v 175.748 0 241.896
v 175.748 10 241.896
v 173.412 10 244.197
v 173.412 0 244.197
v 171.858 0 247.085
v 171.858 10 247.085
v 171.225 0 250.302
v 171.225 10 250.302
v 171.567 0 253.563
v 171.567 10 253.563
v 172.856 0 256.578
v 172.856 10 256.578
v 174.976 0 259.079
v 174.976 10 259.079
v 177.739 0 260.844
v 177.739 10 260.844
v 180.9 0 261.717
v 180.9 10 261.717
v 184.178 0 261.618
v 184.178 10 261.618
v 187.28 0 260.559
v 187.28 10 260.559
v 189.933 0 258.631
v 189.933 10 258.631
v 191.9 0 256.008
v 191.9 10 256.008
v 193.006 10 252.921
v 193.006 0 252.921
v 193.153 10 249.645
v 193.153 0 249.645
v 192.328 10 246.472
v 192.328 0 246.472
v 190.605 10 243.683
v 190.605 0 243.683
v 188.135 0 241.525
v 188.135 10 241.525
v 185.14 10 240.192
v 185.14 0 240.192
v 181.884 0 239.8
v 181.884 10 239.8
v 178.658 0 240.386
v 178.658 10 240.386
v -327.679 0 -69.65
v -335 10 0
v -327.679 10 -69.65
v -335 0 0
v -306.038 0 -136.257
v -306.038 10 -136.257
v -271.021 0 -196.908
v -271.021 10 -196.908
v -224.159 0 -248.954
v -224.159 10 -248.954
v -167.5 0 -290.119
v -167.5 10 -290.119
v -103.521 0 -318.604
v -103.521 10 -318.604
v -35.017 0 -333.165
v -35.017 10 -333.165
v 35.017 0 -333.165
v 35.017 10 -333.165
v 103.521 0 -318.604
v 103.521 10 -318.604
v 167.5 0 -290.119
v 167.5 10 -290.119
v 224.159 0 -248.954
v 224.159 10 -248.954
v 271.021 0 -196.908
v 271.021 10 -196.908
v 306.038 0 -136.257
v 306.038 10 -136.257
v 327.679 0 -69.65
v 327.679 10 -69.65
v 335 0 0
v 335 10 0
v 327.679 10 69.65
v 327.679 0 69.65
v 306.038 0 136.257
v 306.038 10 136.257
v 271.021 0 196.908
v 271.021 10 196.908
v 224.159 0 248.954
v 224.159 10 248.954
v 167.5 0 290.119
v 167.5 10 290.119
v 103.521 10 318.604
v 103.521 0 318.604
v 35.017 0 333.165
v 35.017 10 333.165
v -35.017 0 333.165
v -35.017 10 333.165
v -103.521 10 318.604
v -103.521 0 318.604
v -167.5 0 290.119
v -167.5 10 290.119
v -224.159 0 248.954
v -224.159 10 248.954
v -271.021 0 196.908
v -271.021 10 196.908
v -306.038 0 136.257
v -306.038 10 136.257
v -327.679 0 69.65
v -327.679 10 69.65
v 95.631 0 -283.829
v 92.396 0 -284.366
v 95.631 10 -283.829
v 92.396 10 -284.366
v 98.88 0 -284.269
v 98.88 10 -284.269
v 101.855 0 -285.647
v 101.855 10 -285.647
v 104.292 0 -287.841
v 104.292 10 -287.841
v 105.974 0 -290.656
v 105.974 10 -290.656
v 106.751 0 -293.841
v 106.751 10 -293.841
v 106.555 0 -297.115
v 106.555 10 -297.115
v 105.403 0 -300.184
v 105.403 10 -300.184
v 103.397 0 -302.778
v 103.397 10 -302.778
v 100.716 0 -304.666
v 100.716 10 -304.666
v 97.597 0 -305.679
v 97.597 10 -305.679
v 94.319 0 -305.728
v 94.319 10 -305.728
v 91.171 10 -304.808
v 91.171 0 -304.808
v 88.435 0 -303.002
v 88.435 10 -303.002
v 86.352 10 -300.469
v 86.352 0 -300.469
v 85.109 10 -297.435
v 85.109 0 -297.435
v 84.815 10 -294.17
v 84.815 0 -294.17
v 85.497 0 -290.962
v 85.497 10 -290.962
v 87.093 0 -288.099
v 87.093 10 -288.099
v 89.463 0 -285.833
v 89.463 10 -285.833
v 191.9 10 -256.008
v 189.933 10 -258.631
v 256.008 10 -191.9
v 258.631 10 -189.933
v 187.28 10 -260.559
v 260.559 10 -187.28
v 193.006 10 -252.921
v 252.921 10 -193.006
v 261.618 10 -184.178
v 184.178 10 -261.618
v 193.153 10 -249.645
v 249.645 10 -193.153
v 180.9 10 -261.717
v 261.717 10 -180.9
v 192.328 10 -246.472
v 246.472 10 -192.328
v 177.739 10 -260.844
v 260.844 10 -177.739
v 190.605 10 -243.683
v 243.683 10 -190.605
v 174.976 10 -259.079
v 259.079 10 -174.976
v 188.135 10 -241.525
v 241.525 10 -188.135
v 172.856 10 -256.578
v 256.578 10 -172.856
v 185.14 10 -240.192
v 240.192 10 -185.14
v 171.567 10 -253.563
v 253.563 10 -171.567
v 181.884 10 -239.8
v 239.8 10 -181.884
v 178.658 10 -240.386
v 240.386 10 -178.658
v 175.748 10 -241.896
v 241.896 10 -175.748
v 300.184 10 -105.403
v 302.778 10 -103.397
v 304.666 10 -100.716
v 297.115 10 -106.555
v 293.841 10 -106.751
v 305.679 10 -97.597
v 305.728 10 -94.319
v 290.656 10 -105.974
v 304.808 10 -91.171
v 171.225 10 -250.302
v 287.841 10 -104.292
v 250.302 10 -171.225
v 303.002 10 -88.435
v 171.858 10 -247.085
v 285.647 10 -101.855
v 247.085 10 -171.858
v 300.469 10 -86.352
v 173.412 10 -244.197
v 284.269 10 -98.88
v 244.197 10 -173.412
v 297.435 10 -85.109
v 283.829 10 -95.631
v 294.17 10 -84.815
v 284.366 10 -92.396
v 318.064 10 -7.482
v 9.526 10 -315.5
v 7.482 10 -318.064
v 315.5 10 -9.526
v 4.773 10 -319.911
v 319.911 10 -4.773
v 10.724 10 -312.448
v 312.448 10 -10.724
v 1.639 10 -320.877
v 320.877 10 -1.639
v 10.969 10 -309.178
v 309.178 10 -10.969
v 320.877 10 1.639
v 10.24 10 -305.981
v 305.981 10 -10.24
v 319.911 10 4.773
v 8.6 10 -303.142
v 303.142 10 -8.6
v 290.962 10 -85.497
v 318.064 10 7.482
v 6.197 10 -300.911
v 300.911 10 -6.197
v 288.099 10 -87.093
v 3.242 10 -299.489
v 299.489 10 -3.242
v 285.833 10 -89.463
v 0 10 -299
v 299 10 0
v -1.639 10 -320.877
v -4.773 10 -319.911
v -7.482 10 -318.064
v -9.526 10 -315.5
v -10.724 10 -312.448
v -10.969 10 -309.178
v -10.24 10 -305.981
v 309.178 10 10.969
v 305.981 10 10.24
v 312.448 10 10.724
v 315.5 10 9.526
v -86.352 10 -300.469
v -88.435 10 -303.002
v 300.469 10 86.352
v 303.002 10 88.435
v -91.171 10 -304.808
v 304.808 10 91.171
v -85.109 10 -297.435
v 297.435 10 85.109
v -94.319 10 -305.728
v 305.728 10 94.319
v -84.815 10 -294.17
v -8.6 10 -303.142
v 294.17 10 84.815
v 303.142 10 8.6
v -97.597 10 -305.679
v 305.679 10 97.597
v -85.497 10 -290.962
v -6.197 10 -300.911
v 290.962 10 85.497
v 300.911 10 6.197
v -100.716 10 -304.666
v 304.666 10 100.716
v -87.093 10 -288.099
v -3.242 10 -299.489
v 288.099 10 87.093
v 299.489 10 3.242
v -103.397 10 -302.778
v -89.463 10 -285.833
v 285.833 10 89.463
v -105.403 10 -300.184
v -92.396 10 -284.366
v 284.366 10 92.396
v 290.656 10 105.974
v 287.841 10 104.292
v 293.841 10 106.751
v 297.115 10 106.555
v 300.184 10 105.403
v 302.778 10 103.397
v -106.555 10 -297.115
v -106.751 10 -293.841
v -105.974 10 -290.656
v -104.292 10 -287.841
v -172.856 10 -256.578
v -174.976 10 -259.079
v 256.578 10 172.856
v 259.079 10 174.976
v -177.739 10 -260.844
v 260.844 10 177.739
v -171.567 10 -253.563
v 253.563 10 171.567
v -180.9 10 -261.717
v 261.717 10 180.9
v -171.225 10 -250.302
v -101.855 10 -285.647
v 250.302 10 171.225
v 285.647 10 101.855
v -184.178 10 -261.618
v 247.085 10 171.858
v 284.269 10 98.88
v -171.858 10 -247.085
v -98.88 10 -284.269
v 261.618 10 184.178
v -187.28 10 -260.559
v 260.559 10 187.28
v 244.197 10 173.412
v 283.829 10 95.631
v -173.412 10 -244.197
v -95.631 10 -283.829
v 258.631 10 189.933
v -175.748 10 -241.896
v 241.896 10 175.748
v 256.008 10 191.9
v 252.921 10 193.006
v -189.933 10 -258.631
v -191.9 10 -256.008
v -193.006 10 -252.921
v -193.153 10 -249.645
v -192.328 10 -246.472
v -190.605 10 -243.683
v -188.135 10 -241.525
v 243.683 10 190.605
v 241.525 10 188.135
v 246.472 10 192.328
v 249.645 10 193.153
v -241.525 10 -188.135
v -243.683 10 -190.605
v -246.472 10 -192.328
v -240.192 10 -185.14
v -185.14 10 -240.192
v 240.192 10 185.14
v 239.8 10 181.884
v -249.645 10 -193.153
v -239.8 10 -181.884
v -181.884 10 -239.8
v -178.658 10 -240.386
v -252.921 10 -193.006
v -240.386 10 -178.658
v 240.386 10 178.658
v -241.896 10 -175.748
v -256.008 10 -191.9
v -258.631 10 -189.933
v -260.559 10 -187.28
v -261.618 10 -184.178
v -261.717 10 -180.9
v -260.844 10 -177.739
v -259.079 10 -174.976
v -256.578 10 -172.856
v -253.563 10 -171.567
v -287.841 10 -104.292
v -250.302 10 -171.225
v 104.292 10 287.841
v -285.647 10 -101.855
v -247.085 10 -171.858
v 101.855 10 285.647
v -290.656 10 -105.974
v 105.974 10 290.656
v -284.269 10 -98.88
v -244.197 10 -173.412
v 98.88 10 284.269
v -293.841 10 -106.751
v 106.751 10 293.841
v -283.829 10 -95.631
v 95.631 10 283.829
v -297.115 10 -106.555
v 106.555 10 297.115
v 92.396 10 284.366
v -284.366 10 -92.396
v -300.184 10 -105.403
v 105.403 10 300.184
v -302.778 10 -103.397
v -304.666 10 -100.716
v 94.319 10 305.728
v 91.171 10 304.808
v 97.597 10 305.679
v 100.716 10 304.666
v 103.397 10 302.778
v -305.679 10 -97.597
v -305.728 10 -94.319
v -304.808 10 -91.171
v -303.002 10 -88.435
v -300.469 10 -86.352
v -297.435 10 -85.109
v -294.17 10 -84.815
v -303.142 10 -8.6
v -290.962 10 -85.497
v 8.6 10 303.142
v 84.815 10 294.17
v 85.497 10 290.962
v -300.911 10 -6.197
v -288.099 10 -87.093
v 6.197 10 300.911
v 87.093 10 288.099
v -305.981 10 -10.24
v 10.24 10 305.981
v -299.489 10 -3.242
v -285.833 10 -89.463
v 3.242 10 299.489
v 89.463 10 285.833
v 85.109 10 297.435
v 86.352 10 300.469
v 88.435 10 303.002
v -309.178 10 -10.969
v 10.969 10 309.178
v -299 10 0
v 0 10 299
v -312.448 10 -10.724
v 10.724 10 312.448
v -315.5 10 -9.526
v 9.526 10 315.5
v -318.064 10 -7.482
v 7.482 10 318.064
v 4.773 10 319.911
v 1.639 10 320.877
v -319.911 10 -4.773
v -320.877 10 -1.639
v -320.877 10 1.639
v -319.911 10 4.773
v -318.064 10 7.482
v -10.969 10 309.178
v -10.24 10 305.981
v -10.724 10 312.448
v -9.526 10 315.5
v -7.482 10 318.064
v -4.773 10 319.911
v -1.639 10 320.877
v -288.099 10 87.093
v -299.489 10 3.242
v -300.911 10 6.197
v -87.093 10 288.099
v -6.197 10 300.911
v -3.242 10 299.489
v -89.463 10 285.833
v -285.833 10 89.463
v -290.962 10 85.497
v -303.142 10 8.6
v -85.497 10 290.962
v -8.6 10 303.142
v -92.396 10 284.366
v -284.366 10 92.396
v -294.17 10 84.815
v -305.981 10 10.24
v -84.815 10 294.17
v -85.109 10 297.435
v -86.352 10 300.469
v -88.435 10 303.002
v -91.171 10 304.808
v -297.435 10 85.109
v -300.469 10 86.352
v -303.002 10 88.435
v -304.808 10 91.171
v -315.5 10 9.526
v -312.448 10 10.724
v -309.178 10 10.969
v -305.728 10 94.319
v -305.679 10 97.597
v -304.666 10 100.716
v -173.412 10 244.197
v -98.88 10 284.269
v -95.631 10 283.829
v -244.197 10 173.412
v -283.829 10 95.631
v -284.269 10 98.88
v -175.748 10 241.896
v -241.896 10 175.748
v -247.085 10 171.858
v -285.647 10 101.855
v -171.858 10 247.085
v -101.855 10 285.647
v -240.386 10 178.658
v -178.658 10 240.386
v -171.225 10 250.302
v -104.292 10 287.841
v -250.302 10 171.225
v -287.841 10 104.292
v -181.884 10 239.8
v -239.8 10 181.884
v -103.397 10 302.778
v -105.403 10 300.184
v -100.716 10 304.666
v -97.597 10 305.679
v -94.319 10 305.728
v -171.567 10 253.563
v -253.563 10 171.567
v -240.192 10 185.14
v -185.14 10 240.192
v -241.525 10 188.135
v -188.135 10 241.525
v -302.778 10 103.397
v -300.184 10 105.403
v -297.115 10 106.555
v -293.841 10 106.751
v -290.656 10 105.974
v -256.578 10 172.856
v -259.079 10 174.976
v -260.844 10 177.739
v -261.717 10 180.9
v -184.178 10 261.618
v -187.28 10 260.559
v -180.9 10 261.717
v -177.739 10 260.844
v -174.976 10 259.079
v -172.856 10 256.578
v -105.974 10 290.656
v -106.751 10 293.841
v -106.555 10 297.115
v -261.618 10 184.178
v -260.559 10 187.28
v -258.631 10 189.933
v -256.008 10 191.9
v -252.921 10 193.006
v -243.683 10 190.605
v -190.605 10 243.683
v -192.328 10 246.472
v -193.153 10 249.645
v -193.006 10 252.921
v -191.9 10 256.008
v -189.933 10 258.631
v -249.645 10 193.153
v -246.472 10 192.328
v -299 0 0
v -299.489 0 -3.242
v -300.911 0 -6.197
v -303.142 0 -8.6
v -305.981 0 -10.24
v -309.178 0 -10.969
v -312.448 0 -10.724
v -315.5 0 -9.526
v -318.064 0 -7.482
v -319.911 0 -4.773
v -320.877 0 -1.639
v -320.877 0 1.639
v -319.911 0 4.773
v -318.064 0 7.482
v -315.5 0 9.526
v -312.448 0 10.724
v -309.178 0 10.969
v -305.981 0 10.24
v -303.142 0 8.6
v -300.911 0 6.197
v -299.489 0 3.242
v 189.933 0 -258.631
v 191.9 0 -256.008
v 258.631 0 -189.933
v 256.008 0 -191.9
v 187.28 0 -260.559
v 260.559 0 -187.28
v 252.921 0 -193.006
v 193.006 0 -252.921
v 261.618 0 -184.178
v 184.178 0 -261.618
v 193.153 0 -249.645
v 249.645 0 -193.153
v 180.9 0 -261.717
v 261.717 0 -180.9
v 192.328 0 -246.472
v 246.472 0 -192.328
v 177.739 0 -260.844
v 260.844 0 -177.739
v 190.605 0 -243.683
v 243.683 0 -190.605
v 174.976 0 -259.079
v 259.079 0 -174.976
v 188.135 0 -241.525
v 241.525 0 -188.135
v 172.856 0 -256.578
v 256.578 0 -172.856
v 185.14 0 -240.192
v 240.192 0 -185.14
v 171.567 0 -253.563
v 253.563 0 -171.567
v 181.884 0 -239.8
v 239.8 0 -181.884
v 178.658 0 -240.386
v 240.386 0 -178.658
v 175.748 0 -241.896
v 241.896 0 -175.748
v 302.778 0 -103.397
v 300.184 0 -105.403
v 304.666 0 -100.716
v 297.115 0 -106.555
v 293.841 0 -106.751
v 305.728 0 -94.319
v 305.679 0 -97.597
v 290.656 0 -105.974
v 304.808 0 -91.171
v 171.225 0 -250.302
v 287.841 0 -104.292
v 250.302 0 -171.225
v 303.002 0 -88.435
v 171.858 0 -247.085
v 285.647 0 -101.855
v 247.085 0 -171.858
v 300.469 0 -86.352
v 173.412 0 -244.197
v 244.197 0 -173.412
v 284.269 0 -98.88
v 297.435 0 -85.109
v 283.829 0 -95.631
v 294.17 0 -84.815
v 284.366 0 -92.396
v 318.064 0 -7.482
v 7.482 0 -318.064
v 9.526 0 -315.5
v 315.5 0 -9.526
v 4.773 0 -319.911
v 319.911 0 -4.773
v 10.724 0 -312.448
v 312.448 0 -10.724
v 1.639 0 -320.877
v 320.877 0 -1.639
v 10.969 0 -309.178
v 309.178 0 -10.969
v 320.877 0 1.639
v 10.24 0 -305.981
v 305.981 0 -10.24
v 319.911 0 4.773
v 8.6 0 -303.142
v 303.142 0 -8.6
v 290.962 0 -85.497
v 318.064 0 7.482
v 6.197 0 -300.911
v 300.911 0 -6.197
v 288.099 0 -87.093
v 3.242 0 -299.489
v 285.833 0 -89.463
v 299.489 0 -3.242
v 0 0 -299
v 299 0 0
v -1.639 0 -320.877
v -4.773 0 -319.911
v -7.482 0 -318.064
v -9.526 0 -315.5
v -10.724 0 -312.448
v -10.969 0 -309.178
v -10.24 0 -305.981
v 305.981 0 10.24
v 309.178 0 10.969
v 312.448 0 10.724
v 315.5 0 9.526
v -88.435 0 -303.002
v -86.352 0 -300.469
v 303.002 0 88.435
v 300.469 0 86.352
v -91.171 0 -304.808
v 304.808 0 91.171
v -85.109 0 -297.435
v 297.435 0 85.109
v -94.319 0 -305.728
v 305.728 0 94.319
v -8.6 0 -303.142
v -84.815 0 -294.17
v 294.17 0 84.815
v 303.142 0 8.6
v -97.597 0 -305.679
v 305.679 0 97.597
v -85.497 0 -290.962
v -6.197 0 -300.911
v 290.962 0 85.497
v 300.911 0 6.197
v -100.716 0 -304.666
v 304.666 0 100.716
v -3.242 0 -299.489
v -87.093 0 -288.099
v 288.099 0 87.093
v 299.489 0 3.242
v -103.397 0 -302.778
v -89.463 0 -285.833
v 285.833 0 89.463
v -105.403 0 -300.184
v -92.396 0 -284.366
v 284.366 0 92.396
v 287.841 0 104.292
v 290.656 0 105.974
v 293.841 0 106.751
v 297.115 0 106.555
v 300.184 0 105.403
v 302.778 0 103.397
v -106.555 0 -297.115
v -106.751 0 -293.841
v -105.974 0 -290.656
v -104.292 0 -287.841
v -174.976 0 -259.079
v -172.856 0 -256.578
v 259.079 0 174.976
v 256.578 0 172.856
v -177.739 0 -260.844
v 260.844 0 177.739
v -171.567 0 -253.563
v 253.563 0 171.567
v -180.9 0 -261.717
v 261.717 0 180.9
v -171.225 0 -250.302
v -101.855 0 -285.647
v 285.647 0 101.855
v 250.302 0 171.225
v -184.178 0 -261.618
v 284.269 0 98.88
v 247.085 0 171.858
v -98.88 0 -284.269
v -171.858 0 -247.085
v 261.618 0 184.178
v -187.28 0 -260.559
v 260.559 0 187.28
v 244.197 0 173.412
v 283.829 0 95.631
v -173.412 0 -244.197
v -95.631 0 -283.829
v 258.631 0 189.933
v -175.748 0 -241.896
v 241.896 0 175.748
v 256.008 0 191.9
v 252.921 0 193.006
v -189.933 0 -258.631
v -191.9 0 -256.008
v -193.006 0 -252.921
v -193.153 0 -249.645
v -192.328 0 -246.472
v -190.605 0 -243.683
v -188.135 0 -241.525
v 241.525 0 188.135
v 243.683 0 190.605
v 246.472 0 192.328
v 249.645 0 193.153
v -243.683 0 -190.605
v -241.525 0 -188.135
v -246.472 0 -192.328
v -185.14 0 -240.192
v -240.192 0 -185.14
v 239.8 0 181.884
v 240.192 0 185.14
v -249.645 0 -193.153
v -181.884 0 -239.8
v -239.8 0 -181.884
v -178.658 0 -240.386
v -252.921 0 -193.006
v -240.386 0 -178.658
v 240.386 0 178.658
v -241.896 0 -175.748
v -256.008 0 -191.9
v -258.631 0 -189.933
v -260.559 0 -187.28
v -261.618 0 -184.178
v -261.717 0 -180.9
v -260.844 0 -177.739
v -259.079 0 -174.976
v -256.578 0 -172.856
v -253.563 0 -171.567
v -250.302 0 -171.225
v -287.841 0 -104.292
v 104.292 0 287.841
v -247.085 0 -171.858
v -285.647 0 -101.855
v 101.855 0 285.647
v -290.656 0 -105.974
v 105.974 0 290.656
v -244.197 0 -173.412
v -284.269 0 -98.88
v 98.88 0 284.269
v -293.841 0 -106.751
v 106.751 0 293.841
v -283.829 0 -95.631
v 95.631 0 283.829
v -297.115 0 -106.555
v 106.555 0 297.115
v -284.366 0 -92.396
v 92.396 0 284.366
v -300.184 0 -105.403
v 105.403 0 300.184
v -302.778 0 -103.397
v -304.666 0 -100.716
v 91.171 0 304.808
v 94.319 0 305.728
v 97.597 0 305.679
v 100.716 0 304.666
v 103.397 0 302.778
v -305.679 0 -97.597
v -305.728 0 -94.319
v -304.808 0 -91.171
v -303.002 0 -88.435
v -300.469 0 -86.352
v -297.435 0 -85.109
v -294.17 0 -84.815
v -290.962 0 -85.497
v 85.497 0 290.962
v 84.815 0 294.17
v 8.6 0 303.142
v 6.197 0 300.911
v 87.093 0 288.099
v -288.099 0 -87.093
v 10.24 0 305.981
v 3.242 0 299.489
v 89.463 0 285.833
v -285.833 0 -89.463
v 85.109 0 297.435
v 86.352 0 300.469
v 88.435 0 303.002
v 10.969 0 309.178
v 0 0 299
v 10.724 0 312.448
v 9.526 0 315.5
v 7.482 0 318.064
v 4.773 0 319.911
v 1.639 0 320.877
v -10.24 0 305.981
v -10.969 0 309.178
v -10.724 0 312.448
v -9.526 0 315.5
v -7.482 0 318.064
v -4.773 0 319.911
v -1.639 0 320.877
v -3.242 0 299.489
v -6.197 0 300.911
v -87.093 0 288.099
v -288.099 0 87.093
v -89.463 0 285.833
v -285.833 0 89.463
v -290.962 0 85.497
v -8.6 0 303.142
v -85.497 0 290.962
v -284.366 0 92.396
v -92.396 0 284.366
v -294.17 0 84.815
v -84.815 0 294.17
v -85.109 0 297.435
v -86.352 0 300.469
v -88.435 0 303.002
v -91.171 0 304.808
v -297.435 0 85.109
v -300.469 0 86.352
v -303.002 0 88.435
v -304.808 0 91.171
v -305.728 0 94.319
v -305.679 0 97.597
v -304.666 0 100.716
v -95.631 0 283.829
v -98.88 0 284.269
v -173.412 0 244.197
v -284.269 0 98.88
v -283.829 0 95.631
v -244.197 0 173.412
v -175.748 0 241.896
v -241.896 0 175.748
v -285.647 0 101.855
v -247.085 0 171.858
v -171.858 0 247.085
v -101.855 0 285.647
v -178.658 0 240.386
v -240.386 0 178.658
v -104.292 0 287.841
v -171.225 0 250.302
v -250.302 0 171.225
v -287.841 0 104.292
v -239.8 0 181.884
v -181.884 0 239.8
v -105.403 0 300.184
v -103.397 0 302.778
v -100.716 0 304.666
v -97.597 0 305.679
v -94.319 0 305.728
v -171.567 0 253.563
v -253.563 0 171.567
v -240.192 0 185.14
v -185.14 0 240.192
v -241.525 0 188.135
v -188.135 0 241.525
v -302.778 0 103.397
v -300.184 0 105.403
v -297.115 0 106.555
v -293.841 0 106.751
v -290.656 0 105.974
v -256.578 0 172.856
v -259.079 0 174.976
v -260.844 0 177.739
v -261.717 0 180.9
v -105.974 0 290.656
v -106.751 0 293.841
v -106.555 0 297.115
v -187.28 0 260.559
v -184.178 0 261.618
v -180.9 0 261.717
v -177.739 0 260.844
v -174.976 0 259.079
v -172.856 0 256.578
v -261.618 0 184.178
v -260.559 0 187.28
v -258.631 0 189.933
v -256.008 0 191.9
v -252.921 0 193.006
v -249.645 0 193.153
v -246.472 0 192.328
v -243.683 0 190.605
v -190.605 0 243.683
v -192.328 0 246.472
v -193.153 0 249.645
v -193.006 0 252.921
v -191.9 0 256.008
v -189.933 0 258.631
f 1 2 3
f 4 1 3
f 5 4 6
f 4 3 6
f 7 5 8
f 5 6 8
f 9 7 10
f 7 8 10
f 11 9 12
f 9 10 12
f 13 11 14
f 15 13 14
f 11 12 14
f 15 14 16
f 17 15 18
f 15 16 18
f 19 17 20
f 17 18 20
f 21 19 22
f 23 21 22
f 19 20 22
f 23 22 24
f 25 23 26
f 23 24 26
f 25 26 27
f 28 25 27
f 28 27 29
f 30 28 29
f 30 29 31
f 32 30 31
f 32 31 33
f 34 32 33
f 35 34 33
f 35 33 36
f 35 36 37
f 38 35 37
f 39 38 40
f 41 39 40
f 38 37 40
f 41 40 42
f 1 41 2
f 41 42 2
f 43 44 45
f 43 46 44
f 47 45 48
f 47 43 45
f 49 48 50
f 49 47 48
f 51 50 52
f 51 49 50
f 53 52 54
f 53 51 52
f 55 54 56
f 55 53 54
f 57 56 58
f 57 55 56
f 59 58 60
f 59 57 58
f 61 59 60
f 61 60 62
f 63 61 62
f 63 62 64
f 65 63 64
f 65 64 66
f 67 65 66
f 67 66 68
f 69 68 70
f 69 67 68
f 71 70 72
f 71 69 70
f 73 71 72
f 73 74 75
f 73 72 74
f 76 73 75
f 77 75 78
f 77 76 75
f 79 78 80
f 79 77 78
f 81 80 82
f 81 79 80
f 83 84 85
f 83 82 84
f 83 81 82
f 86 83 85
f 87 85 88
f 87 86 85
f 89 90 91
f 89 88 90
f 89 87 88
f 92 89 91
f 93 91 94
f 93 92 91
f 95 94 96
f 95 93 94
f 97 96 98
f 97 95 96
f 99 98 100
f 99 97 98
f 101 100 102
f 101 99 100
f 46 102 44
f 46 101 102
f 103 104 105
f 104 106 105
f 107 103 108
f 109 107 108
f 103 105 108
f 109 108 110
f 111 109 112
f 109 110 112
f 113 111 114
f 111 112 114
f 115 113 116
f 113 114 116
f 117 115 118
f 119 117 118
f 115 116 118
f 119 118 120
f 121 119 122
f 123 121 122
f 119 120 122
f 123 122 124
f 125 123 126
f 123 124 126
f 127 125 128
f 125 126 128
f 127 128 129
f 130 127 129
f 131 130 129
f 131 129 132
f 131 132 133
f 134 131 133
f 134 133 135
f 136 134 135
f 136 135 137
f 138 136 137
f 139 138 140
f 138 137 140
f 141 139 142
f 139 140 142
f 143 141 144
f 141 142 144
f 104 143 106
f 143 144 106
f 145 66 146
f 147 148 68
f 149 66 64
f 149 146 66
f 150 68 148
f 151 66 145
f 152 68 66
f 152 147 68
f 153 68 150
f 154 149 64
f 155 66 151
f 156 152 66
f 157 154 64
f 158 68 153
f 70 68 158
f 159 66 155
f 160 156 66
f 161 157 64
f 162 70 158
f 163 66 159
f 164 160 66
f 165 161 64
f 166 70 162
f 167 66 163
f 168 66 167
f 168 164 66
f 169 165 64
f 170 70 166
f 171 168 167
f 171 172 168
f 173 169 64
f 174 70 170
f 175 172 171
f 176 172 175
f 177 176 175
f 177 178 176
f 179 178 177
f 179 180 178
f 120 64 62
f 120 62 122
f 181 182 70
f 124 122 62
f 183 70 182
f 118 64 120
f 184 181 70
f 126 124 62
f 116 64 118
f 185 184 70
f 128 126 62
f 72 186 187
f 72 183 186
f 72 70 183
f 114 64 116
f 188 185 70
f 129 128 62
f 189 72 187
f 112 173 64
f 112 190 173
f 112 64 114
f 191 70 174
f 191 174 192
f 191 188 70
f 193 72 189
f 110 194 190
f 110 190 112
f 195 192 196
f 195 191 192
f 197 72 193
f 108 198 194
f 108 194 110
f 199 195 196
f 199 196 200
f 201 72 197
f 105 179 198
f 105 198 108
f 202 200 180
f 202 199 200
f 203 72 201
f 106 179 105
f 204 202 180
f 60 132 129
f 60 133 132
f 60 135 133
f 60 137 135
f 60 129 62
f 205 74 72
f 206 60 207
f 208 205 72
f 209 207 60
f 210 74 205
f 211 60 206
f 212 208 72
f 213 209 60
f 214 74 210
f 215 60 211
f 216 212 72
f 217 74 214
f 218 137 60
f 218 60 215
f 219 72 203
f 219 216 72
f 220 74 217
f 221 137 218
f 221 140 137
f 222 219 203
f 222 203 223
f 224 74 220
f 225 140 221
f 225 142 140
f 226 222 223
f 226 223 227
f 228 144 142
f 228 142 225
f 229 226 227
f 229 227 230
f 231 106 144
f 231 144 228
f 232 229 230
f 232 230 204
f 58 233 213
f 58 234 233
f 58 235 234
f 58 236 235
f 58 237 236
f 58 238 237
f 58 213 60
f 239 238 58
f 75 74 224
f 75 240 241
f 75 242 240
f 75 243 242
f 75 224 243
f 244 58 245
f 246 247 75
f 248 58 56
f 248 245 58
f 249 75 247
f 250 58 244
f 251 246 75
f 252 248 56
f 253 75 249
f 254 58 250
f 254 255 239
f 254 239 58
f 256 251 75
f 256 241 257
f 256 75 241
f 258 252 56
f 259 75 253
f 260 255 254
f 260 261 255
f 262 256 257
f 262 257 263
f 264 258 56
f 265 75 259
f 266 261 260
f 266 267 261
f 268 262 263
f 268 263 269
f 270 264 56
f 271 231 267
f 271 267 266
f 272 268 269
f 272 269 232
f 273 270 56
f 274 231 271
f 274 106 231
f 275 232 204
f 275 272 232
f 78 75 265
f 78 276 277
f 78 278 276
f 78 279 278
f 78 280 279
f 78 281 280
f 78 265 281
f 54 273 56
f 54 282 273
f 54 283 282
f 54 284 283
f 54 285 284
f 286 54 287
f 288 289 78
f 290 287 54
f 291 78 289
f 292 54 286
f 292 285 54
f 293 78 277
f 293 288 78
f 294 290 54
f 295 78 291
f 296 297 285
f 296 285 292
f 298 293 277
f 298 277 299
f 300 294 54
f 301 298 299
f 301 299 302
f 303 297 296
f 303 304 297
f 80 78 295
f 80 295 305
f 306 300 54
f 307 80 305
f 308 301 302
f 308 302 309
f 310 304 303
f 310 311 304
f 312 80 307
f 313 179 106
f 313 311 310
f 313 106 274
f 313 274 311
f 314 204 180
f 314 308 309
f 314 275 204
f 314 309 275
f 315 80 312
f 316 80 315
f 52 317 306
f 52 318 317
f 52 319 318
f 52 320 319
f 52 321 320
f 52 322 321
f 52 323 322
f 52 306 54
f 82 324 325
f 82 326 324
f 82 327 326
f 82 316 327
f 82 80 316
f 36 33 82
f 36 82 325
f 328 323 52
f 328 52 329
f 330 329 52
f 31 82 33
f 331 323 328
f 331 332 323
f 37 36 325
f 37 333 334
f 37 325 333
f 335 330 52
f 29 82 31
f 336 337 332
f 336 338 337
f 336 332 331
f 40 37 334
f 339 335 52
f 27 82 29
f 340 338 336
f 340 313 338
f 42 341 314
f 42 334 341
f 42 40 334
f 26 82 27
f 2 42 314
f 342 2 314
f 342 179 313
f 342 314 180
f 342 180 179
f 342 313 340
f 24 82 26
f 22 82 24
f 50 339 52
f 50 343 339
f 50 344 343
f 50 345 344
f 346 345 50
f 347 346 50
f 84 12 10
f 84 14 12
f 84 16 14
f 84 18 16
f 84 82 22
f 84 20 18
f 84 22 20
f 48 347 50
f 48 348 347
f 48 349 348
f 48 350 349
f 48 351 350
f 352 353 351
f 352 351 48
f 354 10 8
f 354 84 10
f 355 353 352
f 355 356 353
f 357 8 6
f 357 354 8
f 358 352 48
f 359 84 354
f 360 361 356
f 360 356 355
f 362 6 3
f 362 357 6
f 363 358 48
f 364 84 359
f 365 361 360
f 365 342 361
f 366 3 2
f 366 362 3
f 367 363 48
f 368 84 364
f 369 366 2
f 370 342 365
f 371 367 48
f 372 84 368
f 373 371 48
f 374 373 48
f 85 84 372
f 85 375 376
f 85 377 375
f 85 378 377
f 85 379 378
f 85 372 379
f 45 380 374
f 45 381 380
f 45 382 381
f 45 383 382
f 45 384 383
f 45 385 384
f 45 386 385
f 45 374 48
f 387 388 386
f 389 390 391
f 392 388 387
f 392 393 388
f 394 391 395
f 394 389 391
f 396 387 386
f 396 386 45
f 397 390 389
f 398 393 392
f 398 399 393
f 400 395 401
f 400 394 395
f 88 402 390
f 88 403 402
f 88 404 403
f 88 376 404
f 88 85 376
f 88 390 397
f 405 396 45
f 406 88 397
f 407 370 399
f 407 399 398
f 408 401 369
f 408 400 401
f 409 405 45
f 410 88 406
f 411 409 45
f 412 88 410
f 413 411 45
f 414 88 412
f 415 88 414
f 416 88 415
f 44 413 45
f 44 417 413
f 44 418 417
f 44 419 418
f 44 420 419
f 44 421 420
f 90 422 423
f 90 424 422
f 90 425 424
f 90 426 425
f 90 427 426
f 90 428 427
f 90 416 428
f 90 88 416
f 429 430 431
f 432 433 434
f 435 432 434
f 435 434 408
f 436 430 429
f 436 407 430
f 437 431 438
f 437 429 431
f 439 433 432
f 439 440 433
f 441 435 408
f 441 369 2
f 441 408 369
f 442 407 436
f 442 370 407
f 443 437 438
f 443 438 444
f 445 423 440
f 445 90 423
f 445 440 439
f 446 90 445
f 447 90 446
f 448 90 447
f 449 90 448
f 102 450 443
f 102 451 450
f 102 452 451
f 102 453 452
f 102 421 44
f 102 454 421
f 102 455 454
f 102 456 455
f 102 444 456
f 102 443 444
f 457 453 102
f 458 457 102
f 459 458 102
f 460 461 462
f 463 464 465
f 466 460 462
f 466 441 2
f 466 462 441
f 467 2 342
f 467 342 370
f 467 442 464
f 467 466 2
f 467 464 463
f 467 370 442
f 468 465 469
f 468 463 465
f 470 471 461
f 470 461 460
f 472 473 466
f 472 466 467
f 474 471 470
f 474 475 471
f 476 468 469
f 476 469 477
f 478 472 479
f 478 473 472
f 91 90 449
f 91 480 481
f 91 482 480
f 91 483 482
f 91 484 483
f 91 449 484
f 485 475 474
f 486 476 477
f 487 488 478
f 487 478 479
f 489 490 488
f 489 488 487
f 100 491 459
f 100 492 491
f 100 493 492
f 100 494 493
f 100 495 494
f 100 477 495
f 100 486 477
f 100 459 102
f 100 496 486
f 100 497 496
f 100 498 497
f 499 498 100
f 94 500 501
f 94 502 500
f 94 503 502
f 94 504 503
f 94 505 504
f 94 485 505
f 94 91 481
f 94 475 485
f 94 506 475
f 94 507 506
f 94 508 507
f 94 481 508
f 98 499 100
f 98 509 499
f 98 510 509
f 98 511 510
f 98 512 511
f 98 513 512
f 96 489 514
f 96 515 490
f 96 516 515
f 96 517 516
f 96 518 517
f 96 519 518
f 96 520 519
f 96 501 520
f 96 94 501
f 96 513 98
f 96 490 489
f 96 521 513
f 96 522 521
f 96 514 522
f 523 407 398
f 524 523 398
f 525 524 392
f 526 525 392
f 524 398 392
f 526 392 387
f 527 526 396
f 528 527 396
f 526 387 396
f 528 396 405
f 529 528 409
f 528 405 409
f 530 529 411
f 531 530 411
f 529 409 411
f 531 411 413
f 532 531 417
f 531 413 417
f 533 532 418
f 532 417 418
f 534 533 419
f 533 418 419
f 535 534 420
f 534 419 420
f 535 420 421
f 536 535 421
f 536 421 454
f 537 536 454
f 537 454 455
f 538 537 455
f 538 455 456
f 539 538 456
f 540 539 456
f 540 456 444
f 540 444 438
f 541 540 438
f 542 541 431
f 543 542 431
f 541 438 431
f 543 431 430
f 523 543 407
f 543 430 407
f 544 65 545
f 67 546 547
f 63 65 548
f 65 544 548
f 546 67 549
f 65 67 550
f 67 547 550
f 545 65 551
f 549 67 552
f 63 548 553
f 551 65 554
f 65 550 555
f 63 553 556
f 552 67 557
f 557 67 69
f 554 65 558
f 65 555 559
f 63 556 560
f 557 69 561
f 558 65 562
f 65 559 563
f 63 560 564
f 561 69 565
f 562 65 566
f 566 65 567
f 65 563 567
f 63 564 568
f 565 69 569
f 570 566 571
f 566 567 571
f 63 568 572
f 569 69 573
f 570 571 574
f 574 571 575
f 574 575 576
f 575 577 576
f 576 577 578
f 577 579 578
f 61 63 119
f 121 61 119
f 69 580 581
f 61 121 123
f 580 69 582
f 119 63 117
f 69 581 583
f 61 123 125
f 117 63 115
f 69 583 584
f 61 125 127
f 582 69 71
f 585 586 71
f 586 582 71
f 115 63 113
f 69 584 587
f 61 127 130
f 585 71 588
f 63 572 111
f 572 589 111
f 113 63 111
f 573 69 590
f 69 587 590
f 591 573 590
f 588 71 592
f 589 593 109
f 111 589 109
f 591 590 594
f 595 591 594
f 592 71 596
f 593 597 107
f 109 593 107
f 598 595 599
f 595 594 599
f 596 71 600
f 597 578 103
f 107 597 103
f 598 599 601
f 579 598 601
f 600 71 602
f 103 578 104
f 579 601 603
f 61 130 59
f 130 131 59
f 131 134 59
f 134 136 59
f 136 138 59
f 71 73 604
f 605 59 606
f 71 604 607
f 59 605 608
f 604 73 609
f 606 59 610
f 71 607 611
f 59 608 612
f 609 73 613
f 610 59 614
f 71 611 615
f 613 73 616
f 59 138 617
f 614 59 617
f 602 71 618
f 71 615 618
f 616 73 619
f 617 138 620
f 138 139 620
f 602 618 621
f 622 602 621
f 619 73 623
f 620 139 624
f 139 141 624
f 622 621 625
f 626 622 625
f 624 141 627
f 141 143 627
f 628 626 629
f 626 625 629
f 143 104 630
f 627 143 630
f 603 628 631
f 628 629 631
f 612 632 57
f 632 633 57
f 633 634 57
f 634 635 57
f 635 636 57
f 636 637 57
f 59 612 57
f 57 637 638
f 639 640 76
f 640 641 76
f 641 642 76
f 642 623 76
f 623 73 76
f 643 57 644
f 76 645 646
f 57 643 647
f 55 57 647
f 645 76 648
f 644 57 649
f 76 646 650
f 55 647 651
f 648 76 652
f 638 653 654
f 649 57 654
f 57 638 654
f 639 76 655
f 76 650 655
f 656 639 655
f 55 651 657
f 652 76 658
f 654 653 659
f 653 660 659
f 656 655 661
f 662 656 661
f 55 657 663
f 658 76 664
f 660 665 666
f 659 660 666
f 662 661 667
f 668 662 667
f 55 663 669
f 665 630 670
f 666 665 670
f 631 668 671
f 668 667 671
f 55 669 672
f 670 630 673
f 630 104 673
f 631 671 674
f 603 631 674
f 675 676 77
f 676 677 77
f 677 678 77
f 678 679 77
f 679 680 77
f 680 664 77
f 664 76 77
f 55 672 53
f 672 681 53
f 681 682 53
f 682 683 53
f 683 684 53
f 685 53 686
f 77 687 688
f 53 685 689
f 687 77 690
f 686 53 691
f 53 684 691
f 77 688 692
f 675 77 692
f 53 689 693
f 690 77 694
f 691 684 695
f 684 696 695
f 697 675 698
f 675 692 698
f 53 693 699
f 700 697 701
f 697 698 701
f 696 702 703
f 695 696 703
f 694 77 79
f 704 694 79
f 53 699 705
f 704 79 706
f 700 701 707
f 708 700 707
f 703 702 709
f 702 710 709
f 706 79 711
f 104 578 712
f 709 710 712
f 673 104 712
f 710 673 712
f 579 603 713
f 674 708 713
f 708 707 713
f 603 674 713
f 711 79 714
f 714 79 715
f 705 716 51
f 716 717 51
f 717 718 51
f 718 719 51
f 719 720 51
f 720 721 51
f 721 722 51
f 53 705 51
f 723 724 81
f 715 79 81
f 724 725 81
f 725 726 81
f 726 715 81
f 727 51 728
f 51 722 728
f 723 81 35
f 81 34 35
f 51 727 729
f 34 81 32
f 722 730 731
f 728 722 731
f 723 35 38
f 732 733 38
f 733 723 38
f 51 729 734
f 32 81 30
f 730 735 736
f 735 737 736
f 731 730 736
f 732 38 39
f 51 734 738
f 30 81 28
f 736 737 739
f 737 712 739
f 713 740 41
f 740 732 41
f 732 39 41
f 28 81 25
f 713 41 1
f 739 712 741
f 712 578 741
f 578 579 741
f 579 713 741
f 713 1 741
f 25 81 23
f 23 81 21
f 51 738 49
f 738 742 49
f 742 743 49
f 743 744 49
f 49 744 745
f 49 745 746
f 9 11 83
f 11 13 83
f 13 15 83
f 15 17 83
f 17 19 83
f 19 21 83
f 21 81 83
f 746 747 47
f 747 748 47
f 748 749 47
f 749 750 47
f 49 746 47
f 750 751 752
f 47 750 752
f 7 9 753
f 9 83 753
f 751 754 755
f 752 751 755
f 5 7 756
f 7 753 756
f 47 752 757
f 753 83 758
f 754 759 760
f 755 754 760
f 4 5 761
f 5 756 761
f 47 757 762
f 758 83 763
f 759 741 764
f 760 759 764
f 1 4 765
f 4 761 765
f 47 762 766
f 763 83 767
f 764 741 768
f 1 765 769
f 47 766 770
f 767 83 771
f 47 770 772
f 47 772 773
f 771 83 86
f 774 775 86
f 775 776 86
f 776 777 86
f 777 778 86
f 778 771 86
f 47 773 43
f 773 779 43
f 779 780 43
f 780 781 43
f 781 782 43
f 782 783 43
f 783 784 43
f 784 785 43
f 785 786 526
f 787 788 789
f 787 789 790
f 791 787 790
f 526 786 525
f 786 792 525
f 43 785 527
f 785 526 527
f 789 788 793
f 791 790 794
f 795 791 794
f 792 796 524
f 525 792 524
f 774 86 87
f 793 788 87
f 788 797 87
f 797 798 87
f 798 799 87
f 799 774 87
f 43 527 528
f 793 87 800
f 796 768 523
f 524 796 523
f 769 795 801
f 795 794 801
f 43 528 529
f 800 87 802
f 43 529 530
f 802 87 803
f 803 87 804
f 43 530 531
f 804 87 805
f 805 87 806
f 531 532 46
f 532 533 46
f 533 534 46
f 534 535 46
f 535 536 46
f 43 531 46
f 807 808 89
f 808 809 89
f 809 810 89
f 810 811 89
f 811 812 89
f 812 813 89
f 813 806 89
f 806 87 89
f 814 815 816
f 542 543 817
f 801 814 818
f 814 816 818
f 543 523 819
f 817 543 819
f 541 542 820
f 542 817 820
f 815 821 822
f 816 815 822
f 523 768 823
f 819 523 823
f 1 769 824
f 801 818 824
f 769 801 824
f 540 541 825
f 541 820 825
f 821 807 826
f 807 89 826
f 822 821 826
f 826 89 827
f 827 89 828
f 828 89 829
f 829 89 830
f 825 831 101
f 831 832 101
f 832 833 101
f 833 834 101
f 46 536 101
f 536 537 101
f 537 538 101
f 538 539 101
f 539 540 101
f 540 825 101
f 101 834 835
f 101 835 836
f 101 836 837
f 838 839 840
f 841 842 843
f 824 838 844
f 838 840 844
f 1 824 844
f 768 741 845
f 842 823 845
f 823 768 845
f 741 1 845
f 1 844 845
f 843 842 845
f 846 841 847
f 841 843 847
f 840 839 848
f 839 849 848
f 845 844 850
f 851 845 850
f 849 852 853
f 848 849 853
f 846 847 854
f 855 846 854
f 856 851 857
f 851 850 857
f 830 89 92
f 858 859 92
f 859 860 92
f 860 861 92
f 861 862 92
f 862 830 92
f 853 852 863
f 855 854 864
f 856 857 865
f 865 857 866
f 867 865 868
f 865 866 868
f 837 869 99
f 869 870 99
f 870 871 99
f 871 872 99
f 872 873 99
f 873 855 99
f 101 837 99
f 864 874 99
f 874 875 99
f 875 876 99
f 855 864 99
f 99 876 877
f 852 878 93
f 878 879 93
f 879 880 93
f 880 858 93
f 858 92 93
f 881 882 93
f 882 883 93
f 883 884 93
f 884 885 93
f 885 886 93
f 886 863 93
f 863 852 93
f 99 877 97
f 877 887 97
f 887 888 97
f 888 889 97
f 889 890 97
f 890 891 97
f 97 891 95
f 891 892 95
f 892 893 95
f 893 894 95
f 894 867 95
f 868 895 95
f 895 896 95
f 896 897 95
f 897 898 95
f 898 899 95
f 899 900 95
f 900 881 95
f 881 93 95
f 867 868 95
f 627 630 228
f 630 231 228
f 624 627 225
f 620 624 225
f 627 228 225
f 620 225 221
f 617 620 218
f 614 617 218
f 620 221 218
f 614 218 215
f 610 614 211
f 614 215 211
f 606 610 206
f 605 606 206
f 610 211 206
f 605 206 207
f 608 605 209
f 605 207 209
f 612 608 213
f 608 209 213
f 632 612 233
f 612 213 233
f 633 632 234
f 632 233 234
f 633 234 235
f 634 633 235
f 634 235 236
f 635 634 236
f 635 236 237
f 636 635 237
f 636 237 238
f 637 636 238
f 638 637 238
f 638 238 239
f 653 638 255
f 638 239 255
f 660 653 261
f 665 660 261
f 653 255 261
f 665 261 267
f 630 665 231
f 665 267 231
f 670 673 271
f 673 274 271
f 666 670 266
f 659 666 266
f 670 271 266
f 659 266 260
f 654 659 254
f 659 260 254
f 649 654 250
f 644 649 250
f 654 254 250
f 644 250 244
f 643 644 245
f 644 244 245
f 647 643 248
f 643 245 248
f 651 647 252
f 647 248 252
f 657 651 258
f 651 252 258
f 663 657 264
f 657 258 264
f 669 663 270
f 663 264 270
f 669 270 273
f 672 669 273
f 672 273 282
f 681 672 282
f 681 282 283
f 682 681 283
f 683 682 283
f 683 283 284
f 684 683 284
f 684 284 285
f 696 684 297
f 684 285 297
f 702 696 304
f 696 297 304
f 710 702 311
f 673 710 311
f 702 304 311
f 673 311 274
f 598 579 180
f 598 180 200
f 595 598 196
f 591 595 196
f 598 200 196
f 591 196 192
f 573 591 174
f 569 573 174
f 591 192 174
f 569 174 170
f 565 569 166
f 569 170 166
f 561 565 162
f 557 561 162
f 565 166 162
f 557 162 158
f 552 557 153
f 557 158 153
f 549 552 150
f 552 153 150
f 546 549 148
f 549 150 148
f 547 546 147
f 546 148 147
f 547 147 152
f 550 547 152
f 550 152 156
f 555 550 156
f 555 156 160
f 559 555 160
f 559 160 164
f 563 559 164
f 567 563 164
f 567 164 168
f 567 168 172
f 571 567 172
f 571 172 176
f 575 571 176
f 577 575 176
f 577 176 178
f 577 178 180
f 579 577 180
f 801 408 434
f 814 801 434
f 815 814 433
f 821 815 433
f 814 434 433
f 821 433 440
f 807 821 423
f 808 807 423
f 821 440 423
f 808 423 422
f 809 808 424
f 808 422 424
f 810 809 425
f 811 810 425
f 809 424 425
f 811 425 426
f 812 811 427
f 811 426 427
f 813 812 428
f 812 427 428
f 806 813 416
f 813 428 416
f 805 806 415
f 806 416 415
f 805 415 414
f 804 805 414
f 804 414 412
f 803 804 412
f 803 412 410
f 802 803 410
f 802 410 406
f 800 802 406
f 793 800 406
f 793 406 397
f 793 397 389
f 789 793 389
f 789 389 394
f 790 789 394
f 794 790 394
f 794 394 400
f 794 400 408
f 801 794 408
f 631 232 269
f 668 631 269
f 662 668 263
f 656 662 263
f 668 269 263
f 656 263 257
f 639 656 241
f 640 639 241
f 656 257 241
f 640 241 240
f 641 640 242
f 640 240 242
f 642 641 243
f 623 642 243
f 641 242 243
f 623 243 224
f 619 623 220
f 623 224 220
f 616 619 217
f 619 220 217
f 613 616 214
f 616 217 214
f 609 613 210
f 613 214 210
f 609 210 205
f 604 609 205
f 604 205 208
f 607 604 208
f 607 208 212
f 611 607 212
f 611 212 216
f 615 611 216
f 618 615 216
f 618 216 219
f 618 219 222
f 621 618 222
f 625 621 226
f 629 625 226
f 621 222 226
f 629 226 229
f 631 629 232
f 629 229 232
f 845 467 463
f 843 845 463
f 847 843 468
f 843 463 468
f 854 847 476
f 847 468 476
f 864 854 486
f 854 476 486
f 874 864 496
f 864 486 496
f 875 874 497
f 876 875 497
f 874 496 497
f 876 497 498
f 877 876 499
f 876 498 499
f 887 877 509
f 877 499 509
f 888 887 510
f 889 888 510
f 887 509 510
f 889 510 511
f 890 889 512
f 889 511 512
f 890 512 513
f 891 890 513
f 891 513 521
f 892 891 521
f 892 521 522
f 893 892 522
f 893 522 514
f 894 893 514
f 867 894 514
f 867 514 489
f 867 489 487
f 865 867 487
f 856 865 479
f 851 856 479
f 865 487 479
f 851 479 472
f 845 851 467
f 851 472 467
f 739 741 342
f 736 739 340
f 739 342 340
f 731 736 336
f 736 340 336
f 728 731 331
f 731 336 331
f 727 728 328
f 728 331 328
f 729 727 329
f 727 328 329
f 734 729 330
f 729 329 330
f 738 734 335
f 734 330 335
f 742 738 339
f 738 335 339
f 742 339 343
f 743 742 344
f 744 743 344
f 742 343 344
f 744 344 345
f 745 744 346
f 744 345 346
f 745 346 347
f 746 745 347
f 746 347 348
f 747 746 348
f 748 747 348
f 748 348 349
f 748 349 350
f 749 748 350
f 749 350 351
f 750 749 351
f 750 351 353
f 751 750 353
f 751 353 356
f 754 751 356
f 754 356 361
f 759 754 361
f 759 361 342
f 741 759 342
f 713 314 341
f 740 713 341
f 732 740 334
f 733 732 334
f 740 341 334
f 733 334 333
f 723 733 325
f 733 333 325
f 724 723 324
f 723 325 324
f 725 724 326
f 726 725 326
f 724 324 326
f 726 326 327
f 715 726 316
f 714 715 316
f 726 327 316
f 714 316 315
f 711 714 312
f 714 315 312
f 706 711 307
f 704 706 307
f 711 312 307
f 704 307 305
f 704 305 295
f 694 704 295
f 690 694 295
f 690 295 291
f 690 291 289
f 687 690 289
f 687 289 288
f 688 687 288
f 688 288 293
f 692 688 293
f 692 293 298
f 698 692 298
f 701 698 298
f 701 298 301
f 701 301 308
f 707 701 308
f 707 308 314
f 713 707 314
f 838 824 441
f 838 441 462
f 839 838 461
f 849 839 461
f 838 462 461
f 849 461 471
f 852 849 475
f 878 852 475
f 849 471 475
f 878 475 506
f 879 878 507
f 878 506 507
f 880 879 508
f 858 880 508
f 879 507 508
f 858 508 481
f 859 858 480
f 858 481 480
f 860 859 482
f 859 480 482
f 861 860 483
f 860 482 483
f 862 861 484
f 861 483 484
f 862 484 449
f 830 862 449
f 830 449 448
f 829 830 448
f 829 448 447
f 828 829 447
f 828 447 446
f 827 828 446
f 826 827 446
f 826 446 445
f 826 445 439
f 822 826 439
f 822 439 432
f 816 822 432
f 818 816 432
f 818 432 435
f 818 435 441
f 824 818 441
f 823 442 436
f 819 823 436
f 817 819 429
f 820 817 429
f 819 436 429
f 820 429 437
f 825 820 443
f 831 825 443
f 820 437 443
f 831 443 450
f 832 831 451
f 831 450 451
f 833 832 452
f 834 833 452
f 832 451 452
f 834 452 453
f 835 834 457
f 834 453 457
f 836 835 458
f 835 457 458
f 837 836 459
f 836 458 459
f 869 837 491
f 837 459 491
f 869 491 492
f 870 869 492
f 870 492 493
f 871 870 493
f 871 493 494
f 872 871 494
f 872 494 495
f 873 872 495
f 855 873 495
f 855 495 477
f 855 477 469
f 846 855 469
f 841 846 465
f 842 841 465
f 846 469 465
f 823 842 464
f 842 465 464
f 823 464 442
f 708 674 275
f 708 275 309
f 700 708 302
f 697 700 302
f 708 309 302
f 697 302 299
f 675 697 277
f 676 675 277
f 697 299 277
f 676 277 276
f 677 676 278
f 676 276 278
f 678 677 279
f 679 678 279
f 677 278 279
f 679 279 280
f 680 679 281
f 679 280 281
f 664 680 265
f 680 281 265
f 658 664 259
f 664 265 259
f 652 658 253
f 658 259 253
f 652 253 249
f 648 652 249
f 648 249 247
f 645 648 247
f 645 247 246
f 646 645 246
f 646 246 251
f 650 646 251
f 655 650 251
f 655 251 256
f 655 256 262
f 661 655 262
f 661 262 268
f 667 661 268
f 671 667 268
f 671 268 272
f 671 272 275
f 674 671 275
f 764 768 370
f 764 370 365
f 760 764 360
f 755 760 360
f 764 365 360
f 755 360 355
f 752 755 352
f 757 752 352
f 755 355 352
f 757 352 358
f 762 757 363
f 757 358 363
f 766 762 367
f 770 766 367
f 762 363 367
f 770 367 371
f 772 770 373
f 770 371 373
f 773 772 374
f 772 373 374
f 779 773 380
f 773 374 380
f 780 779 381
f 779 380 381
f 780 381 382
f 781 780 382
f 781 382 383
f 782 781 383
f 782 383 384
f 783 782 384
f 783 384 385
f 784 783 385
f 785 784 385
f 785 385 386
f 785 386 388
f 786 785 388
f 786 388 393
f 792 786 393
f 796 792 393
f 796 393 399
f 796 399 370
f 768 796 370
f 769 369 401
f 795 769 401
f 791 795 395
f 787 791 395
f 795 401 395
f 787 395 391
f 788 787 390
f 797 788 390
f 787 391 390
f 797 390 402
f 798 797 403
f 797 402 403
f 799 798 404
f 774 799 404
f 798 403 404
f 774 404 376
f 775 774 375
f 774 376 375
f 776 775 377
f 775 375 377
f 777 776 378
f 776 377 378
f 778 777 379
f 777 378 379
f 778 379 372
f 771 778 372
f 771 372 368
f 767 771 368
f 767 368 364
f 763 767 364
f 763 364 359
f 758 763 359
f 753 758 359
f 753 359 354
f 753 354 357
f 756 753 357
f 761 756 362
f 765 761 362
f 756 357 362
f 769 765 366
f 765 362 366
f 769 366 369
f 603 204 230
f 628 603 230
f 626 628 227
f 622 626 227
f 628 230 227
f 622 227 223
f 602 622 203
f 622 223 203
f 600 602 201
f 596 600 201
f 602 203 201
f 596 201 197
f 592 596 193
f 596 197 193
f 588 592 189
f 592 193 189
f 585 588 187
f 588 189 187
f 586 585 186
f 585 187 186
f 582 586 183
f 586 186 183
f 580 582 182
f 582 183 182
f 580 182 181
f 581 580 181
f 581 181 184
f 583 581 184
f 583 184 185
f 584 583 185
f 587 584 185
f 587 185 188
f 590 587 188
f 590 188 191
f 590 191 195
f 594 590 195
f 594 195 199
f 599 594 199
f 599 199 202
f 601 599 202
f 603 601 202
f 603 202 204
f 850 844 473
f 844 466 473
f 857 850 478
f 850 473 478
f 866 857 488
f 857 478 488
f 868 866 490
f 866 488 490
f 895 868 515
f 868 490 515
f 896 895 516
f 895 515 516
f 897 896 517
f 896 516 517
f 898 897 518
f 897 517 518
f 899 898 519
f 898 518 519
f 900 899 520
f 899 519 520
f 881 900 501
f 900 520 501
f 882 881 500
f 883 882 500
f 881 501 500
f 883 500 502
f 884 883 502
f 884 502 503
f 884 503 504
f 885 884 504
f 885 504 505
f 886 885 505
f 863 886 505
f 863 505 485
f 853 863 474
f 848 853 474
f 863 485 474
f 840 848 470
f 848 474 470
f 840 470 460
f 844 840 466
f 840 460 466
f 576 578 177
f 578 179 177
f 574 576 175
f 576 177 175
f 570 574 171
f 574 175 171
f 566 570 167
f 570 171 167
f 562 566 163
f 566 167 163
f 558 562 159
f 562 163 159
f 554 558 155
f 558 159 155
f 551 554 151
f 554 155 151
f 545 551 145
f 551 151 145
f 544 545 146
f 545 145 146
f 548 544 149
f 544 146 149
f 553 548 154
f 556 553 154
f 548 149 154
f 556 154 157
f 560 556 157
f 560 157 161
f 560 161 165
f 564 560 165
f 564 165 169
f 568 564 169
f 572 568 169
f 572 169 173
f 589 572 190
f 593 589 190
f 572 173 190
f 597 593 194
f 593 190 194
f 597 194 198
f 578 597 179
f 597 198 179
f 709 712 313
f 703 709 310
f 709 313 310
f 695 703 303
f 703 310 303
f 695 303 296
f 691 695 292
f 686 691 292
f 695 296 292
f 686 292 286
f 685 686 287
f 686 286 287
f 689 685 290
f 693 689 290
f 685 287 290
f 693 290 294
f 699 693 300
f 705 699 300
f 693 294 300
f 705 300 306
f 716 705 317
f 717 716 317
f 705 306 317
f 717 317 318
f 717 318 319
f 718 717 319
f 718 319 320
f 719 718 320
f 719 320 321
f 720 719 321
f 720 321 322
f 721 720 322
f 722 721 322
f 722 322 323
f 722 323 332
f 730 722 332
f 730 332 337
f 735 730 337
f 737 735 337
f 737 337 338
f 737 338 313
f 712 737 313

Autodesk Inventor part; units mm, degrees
ref_plane "YZ Plane" through (0, 0, 0) normal (1, 0, 0) x (0, 1, 0)
ref_plane "XZ Plane" through (0, 0, 0) normal (0, 1, 0) x (-1, 0, 0)
ref_plane "XY Plane" through (0, 0, 0) normal (0, 0, 1) x (1, 0, 0)
sketch "Sketch1" plane through (0, 0, 0) normal (0, 1, 0) x (-1, 0, 0)
  circle A0 centre (0, 0) radius 335
  dimension "d0" = 670
extrude "Extrusion1" add sketch "Sketch1" along normal blind 10
sketch "Sketch2" plane through (0, 10, 0) normal (0, 1, 0) x (1, 0, 0)
  circle A0 centre (-310, 0) radius 11
  circle A1 centre (0, 0) radius 310 construction
  dimension "d4" = 620
  dimension "d3" = 22
extrude "Cut1" cut sketch "Sketch2" against normal blind 10
pattern_circular "Circular Pattern1" count 20 over 360 about axis through (0, 0, 0) along (0, 1, 0) of "Cut1"
equation "\"d1\" = Thickness"
equation "\"d6\" = Thickness"
equation "\"BendReliefDepth\" = 0.5 * Thickness"
equation "\"Thickness\" = 10"
properties part number "PRS 1621 charging hatch D940"
